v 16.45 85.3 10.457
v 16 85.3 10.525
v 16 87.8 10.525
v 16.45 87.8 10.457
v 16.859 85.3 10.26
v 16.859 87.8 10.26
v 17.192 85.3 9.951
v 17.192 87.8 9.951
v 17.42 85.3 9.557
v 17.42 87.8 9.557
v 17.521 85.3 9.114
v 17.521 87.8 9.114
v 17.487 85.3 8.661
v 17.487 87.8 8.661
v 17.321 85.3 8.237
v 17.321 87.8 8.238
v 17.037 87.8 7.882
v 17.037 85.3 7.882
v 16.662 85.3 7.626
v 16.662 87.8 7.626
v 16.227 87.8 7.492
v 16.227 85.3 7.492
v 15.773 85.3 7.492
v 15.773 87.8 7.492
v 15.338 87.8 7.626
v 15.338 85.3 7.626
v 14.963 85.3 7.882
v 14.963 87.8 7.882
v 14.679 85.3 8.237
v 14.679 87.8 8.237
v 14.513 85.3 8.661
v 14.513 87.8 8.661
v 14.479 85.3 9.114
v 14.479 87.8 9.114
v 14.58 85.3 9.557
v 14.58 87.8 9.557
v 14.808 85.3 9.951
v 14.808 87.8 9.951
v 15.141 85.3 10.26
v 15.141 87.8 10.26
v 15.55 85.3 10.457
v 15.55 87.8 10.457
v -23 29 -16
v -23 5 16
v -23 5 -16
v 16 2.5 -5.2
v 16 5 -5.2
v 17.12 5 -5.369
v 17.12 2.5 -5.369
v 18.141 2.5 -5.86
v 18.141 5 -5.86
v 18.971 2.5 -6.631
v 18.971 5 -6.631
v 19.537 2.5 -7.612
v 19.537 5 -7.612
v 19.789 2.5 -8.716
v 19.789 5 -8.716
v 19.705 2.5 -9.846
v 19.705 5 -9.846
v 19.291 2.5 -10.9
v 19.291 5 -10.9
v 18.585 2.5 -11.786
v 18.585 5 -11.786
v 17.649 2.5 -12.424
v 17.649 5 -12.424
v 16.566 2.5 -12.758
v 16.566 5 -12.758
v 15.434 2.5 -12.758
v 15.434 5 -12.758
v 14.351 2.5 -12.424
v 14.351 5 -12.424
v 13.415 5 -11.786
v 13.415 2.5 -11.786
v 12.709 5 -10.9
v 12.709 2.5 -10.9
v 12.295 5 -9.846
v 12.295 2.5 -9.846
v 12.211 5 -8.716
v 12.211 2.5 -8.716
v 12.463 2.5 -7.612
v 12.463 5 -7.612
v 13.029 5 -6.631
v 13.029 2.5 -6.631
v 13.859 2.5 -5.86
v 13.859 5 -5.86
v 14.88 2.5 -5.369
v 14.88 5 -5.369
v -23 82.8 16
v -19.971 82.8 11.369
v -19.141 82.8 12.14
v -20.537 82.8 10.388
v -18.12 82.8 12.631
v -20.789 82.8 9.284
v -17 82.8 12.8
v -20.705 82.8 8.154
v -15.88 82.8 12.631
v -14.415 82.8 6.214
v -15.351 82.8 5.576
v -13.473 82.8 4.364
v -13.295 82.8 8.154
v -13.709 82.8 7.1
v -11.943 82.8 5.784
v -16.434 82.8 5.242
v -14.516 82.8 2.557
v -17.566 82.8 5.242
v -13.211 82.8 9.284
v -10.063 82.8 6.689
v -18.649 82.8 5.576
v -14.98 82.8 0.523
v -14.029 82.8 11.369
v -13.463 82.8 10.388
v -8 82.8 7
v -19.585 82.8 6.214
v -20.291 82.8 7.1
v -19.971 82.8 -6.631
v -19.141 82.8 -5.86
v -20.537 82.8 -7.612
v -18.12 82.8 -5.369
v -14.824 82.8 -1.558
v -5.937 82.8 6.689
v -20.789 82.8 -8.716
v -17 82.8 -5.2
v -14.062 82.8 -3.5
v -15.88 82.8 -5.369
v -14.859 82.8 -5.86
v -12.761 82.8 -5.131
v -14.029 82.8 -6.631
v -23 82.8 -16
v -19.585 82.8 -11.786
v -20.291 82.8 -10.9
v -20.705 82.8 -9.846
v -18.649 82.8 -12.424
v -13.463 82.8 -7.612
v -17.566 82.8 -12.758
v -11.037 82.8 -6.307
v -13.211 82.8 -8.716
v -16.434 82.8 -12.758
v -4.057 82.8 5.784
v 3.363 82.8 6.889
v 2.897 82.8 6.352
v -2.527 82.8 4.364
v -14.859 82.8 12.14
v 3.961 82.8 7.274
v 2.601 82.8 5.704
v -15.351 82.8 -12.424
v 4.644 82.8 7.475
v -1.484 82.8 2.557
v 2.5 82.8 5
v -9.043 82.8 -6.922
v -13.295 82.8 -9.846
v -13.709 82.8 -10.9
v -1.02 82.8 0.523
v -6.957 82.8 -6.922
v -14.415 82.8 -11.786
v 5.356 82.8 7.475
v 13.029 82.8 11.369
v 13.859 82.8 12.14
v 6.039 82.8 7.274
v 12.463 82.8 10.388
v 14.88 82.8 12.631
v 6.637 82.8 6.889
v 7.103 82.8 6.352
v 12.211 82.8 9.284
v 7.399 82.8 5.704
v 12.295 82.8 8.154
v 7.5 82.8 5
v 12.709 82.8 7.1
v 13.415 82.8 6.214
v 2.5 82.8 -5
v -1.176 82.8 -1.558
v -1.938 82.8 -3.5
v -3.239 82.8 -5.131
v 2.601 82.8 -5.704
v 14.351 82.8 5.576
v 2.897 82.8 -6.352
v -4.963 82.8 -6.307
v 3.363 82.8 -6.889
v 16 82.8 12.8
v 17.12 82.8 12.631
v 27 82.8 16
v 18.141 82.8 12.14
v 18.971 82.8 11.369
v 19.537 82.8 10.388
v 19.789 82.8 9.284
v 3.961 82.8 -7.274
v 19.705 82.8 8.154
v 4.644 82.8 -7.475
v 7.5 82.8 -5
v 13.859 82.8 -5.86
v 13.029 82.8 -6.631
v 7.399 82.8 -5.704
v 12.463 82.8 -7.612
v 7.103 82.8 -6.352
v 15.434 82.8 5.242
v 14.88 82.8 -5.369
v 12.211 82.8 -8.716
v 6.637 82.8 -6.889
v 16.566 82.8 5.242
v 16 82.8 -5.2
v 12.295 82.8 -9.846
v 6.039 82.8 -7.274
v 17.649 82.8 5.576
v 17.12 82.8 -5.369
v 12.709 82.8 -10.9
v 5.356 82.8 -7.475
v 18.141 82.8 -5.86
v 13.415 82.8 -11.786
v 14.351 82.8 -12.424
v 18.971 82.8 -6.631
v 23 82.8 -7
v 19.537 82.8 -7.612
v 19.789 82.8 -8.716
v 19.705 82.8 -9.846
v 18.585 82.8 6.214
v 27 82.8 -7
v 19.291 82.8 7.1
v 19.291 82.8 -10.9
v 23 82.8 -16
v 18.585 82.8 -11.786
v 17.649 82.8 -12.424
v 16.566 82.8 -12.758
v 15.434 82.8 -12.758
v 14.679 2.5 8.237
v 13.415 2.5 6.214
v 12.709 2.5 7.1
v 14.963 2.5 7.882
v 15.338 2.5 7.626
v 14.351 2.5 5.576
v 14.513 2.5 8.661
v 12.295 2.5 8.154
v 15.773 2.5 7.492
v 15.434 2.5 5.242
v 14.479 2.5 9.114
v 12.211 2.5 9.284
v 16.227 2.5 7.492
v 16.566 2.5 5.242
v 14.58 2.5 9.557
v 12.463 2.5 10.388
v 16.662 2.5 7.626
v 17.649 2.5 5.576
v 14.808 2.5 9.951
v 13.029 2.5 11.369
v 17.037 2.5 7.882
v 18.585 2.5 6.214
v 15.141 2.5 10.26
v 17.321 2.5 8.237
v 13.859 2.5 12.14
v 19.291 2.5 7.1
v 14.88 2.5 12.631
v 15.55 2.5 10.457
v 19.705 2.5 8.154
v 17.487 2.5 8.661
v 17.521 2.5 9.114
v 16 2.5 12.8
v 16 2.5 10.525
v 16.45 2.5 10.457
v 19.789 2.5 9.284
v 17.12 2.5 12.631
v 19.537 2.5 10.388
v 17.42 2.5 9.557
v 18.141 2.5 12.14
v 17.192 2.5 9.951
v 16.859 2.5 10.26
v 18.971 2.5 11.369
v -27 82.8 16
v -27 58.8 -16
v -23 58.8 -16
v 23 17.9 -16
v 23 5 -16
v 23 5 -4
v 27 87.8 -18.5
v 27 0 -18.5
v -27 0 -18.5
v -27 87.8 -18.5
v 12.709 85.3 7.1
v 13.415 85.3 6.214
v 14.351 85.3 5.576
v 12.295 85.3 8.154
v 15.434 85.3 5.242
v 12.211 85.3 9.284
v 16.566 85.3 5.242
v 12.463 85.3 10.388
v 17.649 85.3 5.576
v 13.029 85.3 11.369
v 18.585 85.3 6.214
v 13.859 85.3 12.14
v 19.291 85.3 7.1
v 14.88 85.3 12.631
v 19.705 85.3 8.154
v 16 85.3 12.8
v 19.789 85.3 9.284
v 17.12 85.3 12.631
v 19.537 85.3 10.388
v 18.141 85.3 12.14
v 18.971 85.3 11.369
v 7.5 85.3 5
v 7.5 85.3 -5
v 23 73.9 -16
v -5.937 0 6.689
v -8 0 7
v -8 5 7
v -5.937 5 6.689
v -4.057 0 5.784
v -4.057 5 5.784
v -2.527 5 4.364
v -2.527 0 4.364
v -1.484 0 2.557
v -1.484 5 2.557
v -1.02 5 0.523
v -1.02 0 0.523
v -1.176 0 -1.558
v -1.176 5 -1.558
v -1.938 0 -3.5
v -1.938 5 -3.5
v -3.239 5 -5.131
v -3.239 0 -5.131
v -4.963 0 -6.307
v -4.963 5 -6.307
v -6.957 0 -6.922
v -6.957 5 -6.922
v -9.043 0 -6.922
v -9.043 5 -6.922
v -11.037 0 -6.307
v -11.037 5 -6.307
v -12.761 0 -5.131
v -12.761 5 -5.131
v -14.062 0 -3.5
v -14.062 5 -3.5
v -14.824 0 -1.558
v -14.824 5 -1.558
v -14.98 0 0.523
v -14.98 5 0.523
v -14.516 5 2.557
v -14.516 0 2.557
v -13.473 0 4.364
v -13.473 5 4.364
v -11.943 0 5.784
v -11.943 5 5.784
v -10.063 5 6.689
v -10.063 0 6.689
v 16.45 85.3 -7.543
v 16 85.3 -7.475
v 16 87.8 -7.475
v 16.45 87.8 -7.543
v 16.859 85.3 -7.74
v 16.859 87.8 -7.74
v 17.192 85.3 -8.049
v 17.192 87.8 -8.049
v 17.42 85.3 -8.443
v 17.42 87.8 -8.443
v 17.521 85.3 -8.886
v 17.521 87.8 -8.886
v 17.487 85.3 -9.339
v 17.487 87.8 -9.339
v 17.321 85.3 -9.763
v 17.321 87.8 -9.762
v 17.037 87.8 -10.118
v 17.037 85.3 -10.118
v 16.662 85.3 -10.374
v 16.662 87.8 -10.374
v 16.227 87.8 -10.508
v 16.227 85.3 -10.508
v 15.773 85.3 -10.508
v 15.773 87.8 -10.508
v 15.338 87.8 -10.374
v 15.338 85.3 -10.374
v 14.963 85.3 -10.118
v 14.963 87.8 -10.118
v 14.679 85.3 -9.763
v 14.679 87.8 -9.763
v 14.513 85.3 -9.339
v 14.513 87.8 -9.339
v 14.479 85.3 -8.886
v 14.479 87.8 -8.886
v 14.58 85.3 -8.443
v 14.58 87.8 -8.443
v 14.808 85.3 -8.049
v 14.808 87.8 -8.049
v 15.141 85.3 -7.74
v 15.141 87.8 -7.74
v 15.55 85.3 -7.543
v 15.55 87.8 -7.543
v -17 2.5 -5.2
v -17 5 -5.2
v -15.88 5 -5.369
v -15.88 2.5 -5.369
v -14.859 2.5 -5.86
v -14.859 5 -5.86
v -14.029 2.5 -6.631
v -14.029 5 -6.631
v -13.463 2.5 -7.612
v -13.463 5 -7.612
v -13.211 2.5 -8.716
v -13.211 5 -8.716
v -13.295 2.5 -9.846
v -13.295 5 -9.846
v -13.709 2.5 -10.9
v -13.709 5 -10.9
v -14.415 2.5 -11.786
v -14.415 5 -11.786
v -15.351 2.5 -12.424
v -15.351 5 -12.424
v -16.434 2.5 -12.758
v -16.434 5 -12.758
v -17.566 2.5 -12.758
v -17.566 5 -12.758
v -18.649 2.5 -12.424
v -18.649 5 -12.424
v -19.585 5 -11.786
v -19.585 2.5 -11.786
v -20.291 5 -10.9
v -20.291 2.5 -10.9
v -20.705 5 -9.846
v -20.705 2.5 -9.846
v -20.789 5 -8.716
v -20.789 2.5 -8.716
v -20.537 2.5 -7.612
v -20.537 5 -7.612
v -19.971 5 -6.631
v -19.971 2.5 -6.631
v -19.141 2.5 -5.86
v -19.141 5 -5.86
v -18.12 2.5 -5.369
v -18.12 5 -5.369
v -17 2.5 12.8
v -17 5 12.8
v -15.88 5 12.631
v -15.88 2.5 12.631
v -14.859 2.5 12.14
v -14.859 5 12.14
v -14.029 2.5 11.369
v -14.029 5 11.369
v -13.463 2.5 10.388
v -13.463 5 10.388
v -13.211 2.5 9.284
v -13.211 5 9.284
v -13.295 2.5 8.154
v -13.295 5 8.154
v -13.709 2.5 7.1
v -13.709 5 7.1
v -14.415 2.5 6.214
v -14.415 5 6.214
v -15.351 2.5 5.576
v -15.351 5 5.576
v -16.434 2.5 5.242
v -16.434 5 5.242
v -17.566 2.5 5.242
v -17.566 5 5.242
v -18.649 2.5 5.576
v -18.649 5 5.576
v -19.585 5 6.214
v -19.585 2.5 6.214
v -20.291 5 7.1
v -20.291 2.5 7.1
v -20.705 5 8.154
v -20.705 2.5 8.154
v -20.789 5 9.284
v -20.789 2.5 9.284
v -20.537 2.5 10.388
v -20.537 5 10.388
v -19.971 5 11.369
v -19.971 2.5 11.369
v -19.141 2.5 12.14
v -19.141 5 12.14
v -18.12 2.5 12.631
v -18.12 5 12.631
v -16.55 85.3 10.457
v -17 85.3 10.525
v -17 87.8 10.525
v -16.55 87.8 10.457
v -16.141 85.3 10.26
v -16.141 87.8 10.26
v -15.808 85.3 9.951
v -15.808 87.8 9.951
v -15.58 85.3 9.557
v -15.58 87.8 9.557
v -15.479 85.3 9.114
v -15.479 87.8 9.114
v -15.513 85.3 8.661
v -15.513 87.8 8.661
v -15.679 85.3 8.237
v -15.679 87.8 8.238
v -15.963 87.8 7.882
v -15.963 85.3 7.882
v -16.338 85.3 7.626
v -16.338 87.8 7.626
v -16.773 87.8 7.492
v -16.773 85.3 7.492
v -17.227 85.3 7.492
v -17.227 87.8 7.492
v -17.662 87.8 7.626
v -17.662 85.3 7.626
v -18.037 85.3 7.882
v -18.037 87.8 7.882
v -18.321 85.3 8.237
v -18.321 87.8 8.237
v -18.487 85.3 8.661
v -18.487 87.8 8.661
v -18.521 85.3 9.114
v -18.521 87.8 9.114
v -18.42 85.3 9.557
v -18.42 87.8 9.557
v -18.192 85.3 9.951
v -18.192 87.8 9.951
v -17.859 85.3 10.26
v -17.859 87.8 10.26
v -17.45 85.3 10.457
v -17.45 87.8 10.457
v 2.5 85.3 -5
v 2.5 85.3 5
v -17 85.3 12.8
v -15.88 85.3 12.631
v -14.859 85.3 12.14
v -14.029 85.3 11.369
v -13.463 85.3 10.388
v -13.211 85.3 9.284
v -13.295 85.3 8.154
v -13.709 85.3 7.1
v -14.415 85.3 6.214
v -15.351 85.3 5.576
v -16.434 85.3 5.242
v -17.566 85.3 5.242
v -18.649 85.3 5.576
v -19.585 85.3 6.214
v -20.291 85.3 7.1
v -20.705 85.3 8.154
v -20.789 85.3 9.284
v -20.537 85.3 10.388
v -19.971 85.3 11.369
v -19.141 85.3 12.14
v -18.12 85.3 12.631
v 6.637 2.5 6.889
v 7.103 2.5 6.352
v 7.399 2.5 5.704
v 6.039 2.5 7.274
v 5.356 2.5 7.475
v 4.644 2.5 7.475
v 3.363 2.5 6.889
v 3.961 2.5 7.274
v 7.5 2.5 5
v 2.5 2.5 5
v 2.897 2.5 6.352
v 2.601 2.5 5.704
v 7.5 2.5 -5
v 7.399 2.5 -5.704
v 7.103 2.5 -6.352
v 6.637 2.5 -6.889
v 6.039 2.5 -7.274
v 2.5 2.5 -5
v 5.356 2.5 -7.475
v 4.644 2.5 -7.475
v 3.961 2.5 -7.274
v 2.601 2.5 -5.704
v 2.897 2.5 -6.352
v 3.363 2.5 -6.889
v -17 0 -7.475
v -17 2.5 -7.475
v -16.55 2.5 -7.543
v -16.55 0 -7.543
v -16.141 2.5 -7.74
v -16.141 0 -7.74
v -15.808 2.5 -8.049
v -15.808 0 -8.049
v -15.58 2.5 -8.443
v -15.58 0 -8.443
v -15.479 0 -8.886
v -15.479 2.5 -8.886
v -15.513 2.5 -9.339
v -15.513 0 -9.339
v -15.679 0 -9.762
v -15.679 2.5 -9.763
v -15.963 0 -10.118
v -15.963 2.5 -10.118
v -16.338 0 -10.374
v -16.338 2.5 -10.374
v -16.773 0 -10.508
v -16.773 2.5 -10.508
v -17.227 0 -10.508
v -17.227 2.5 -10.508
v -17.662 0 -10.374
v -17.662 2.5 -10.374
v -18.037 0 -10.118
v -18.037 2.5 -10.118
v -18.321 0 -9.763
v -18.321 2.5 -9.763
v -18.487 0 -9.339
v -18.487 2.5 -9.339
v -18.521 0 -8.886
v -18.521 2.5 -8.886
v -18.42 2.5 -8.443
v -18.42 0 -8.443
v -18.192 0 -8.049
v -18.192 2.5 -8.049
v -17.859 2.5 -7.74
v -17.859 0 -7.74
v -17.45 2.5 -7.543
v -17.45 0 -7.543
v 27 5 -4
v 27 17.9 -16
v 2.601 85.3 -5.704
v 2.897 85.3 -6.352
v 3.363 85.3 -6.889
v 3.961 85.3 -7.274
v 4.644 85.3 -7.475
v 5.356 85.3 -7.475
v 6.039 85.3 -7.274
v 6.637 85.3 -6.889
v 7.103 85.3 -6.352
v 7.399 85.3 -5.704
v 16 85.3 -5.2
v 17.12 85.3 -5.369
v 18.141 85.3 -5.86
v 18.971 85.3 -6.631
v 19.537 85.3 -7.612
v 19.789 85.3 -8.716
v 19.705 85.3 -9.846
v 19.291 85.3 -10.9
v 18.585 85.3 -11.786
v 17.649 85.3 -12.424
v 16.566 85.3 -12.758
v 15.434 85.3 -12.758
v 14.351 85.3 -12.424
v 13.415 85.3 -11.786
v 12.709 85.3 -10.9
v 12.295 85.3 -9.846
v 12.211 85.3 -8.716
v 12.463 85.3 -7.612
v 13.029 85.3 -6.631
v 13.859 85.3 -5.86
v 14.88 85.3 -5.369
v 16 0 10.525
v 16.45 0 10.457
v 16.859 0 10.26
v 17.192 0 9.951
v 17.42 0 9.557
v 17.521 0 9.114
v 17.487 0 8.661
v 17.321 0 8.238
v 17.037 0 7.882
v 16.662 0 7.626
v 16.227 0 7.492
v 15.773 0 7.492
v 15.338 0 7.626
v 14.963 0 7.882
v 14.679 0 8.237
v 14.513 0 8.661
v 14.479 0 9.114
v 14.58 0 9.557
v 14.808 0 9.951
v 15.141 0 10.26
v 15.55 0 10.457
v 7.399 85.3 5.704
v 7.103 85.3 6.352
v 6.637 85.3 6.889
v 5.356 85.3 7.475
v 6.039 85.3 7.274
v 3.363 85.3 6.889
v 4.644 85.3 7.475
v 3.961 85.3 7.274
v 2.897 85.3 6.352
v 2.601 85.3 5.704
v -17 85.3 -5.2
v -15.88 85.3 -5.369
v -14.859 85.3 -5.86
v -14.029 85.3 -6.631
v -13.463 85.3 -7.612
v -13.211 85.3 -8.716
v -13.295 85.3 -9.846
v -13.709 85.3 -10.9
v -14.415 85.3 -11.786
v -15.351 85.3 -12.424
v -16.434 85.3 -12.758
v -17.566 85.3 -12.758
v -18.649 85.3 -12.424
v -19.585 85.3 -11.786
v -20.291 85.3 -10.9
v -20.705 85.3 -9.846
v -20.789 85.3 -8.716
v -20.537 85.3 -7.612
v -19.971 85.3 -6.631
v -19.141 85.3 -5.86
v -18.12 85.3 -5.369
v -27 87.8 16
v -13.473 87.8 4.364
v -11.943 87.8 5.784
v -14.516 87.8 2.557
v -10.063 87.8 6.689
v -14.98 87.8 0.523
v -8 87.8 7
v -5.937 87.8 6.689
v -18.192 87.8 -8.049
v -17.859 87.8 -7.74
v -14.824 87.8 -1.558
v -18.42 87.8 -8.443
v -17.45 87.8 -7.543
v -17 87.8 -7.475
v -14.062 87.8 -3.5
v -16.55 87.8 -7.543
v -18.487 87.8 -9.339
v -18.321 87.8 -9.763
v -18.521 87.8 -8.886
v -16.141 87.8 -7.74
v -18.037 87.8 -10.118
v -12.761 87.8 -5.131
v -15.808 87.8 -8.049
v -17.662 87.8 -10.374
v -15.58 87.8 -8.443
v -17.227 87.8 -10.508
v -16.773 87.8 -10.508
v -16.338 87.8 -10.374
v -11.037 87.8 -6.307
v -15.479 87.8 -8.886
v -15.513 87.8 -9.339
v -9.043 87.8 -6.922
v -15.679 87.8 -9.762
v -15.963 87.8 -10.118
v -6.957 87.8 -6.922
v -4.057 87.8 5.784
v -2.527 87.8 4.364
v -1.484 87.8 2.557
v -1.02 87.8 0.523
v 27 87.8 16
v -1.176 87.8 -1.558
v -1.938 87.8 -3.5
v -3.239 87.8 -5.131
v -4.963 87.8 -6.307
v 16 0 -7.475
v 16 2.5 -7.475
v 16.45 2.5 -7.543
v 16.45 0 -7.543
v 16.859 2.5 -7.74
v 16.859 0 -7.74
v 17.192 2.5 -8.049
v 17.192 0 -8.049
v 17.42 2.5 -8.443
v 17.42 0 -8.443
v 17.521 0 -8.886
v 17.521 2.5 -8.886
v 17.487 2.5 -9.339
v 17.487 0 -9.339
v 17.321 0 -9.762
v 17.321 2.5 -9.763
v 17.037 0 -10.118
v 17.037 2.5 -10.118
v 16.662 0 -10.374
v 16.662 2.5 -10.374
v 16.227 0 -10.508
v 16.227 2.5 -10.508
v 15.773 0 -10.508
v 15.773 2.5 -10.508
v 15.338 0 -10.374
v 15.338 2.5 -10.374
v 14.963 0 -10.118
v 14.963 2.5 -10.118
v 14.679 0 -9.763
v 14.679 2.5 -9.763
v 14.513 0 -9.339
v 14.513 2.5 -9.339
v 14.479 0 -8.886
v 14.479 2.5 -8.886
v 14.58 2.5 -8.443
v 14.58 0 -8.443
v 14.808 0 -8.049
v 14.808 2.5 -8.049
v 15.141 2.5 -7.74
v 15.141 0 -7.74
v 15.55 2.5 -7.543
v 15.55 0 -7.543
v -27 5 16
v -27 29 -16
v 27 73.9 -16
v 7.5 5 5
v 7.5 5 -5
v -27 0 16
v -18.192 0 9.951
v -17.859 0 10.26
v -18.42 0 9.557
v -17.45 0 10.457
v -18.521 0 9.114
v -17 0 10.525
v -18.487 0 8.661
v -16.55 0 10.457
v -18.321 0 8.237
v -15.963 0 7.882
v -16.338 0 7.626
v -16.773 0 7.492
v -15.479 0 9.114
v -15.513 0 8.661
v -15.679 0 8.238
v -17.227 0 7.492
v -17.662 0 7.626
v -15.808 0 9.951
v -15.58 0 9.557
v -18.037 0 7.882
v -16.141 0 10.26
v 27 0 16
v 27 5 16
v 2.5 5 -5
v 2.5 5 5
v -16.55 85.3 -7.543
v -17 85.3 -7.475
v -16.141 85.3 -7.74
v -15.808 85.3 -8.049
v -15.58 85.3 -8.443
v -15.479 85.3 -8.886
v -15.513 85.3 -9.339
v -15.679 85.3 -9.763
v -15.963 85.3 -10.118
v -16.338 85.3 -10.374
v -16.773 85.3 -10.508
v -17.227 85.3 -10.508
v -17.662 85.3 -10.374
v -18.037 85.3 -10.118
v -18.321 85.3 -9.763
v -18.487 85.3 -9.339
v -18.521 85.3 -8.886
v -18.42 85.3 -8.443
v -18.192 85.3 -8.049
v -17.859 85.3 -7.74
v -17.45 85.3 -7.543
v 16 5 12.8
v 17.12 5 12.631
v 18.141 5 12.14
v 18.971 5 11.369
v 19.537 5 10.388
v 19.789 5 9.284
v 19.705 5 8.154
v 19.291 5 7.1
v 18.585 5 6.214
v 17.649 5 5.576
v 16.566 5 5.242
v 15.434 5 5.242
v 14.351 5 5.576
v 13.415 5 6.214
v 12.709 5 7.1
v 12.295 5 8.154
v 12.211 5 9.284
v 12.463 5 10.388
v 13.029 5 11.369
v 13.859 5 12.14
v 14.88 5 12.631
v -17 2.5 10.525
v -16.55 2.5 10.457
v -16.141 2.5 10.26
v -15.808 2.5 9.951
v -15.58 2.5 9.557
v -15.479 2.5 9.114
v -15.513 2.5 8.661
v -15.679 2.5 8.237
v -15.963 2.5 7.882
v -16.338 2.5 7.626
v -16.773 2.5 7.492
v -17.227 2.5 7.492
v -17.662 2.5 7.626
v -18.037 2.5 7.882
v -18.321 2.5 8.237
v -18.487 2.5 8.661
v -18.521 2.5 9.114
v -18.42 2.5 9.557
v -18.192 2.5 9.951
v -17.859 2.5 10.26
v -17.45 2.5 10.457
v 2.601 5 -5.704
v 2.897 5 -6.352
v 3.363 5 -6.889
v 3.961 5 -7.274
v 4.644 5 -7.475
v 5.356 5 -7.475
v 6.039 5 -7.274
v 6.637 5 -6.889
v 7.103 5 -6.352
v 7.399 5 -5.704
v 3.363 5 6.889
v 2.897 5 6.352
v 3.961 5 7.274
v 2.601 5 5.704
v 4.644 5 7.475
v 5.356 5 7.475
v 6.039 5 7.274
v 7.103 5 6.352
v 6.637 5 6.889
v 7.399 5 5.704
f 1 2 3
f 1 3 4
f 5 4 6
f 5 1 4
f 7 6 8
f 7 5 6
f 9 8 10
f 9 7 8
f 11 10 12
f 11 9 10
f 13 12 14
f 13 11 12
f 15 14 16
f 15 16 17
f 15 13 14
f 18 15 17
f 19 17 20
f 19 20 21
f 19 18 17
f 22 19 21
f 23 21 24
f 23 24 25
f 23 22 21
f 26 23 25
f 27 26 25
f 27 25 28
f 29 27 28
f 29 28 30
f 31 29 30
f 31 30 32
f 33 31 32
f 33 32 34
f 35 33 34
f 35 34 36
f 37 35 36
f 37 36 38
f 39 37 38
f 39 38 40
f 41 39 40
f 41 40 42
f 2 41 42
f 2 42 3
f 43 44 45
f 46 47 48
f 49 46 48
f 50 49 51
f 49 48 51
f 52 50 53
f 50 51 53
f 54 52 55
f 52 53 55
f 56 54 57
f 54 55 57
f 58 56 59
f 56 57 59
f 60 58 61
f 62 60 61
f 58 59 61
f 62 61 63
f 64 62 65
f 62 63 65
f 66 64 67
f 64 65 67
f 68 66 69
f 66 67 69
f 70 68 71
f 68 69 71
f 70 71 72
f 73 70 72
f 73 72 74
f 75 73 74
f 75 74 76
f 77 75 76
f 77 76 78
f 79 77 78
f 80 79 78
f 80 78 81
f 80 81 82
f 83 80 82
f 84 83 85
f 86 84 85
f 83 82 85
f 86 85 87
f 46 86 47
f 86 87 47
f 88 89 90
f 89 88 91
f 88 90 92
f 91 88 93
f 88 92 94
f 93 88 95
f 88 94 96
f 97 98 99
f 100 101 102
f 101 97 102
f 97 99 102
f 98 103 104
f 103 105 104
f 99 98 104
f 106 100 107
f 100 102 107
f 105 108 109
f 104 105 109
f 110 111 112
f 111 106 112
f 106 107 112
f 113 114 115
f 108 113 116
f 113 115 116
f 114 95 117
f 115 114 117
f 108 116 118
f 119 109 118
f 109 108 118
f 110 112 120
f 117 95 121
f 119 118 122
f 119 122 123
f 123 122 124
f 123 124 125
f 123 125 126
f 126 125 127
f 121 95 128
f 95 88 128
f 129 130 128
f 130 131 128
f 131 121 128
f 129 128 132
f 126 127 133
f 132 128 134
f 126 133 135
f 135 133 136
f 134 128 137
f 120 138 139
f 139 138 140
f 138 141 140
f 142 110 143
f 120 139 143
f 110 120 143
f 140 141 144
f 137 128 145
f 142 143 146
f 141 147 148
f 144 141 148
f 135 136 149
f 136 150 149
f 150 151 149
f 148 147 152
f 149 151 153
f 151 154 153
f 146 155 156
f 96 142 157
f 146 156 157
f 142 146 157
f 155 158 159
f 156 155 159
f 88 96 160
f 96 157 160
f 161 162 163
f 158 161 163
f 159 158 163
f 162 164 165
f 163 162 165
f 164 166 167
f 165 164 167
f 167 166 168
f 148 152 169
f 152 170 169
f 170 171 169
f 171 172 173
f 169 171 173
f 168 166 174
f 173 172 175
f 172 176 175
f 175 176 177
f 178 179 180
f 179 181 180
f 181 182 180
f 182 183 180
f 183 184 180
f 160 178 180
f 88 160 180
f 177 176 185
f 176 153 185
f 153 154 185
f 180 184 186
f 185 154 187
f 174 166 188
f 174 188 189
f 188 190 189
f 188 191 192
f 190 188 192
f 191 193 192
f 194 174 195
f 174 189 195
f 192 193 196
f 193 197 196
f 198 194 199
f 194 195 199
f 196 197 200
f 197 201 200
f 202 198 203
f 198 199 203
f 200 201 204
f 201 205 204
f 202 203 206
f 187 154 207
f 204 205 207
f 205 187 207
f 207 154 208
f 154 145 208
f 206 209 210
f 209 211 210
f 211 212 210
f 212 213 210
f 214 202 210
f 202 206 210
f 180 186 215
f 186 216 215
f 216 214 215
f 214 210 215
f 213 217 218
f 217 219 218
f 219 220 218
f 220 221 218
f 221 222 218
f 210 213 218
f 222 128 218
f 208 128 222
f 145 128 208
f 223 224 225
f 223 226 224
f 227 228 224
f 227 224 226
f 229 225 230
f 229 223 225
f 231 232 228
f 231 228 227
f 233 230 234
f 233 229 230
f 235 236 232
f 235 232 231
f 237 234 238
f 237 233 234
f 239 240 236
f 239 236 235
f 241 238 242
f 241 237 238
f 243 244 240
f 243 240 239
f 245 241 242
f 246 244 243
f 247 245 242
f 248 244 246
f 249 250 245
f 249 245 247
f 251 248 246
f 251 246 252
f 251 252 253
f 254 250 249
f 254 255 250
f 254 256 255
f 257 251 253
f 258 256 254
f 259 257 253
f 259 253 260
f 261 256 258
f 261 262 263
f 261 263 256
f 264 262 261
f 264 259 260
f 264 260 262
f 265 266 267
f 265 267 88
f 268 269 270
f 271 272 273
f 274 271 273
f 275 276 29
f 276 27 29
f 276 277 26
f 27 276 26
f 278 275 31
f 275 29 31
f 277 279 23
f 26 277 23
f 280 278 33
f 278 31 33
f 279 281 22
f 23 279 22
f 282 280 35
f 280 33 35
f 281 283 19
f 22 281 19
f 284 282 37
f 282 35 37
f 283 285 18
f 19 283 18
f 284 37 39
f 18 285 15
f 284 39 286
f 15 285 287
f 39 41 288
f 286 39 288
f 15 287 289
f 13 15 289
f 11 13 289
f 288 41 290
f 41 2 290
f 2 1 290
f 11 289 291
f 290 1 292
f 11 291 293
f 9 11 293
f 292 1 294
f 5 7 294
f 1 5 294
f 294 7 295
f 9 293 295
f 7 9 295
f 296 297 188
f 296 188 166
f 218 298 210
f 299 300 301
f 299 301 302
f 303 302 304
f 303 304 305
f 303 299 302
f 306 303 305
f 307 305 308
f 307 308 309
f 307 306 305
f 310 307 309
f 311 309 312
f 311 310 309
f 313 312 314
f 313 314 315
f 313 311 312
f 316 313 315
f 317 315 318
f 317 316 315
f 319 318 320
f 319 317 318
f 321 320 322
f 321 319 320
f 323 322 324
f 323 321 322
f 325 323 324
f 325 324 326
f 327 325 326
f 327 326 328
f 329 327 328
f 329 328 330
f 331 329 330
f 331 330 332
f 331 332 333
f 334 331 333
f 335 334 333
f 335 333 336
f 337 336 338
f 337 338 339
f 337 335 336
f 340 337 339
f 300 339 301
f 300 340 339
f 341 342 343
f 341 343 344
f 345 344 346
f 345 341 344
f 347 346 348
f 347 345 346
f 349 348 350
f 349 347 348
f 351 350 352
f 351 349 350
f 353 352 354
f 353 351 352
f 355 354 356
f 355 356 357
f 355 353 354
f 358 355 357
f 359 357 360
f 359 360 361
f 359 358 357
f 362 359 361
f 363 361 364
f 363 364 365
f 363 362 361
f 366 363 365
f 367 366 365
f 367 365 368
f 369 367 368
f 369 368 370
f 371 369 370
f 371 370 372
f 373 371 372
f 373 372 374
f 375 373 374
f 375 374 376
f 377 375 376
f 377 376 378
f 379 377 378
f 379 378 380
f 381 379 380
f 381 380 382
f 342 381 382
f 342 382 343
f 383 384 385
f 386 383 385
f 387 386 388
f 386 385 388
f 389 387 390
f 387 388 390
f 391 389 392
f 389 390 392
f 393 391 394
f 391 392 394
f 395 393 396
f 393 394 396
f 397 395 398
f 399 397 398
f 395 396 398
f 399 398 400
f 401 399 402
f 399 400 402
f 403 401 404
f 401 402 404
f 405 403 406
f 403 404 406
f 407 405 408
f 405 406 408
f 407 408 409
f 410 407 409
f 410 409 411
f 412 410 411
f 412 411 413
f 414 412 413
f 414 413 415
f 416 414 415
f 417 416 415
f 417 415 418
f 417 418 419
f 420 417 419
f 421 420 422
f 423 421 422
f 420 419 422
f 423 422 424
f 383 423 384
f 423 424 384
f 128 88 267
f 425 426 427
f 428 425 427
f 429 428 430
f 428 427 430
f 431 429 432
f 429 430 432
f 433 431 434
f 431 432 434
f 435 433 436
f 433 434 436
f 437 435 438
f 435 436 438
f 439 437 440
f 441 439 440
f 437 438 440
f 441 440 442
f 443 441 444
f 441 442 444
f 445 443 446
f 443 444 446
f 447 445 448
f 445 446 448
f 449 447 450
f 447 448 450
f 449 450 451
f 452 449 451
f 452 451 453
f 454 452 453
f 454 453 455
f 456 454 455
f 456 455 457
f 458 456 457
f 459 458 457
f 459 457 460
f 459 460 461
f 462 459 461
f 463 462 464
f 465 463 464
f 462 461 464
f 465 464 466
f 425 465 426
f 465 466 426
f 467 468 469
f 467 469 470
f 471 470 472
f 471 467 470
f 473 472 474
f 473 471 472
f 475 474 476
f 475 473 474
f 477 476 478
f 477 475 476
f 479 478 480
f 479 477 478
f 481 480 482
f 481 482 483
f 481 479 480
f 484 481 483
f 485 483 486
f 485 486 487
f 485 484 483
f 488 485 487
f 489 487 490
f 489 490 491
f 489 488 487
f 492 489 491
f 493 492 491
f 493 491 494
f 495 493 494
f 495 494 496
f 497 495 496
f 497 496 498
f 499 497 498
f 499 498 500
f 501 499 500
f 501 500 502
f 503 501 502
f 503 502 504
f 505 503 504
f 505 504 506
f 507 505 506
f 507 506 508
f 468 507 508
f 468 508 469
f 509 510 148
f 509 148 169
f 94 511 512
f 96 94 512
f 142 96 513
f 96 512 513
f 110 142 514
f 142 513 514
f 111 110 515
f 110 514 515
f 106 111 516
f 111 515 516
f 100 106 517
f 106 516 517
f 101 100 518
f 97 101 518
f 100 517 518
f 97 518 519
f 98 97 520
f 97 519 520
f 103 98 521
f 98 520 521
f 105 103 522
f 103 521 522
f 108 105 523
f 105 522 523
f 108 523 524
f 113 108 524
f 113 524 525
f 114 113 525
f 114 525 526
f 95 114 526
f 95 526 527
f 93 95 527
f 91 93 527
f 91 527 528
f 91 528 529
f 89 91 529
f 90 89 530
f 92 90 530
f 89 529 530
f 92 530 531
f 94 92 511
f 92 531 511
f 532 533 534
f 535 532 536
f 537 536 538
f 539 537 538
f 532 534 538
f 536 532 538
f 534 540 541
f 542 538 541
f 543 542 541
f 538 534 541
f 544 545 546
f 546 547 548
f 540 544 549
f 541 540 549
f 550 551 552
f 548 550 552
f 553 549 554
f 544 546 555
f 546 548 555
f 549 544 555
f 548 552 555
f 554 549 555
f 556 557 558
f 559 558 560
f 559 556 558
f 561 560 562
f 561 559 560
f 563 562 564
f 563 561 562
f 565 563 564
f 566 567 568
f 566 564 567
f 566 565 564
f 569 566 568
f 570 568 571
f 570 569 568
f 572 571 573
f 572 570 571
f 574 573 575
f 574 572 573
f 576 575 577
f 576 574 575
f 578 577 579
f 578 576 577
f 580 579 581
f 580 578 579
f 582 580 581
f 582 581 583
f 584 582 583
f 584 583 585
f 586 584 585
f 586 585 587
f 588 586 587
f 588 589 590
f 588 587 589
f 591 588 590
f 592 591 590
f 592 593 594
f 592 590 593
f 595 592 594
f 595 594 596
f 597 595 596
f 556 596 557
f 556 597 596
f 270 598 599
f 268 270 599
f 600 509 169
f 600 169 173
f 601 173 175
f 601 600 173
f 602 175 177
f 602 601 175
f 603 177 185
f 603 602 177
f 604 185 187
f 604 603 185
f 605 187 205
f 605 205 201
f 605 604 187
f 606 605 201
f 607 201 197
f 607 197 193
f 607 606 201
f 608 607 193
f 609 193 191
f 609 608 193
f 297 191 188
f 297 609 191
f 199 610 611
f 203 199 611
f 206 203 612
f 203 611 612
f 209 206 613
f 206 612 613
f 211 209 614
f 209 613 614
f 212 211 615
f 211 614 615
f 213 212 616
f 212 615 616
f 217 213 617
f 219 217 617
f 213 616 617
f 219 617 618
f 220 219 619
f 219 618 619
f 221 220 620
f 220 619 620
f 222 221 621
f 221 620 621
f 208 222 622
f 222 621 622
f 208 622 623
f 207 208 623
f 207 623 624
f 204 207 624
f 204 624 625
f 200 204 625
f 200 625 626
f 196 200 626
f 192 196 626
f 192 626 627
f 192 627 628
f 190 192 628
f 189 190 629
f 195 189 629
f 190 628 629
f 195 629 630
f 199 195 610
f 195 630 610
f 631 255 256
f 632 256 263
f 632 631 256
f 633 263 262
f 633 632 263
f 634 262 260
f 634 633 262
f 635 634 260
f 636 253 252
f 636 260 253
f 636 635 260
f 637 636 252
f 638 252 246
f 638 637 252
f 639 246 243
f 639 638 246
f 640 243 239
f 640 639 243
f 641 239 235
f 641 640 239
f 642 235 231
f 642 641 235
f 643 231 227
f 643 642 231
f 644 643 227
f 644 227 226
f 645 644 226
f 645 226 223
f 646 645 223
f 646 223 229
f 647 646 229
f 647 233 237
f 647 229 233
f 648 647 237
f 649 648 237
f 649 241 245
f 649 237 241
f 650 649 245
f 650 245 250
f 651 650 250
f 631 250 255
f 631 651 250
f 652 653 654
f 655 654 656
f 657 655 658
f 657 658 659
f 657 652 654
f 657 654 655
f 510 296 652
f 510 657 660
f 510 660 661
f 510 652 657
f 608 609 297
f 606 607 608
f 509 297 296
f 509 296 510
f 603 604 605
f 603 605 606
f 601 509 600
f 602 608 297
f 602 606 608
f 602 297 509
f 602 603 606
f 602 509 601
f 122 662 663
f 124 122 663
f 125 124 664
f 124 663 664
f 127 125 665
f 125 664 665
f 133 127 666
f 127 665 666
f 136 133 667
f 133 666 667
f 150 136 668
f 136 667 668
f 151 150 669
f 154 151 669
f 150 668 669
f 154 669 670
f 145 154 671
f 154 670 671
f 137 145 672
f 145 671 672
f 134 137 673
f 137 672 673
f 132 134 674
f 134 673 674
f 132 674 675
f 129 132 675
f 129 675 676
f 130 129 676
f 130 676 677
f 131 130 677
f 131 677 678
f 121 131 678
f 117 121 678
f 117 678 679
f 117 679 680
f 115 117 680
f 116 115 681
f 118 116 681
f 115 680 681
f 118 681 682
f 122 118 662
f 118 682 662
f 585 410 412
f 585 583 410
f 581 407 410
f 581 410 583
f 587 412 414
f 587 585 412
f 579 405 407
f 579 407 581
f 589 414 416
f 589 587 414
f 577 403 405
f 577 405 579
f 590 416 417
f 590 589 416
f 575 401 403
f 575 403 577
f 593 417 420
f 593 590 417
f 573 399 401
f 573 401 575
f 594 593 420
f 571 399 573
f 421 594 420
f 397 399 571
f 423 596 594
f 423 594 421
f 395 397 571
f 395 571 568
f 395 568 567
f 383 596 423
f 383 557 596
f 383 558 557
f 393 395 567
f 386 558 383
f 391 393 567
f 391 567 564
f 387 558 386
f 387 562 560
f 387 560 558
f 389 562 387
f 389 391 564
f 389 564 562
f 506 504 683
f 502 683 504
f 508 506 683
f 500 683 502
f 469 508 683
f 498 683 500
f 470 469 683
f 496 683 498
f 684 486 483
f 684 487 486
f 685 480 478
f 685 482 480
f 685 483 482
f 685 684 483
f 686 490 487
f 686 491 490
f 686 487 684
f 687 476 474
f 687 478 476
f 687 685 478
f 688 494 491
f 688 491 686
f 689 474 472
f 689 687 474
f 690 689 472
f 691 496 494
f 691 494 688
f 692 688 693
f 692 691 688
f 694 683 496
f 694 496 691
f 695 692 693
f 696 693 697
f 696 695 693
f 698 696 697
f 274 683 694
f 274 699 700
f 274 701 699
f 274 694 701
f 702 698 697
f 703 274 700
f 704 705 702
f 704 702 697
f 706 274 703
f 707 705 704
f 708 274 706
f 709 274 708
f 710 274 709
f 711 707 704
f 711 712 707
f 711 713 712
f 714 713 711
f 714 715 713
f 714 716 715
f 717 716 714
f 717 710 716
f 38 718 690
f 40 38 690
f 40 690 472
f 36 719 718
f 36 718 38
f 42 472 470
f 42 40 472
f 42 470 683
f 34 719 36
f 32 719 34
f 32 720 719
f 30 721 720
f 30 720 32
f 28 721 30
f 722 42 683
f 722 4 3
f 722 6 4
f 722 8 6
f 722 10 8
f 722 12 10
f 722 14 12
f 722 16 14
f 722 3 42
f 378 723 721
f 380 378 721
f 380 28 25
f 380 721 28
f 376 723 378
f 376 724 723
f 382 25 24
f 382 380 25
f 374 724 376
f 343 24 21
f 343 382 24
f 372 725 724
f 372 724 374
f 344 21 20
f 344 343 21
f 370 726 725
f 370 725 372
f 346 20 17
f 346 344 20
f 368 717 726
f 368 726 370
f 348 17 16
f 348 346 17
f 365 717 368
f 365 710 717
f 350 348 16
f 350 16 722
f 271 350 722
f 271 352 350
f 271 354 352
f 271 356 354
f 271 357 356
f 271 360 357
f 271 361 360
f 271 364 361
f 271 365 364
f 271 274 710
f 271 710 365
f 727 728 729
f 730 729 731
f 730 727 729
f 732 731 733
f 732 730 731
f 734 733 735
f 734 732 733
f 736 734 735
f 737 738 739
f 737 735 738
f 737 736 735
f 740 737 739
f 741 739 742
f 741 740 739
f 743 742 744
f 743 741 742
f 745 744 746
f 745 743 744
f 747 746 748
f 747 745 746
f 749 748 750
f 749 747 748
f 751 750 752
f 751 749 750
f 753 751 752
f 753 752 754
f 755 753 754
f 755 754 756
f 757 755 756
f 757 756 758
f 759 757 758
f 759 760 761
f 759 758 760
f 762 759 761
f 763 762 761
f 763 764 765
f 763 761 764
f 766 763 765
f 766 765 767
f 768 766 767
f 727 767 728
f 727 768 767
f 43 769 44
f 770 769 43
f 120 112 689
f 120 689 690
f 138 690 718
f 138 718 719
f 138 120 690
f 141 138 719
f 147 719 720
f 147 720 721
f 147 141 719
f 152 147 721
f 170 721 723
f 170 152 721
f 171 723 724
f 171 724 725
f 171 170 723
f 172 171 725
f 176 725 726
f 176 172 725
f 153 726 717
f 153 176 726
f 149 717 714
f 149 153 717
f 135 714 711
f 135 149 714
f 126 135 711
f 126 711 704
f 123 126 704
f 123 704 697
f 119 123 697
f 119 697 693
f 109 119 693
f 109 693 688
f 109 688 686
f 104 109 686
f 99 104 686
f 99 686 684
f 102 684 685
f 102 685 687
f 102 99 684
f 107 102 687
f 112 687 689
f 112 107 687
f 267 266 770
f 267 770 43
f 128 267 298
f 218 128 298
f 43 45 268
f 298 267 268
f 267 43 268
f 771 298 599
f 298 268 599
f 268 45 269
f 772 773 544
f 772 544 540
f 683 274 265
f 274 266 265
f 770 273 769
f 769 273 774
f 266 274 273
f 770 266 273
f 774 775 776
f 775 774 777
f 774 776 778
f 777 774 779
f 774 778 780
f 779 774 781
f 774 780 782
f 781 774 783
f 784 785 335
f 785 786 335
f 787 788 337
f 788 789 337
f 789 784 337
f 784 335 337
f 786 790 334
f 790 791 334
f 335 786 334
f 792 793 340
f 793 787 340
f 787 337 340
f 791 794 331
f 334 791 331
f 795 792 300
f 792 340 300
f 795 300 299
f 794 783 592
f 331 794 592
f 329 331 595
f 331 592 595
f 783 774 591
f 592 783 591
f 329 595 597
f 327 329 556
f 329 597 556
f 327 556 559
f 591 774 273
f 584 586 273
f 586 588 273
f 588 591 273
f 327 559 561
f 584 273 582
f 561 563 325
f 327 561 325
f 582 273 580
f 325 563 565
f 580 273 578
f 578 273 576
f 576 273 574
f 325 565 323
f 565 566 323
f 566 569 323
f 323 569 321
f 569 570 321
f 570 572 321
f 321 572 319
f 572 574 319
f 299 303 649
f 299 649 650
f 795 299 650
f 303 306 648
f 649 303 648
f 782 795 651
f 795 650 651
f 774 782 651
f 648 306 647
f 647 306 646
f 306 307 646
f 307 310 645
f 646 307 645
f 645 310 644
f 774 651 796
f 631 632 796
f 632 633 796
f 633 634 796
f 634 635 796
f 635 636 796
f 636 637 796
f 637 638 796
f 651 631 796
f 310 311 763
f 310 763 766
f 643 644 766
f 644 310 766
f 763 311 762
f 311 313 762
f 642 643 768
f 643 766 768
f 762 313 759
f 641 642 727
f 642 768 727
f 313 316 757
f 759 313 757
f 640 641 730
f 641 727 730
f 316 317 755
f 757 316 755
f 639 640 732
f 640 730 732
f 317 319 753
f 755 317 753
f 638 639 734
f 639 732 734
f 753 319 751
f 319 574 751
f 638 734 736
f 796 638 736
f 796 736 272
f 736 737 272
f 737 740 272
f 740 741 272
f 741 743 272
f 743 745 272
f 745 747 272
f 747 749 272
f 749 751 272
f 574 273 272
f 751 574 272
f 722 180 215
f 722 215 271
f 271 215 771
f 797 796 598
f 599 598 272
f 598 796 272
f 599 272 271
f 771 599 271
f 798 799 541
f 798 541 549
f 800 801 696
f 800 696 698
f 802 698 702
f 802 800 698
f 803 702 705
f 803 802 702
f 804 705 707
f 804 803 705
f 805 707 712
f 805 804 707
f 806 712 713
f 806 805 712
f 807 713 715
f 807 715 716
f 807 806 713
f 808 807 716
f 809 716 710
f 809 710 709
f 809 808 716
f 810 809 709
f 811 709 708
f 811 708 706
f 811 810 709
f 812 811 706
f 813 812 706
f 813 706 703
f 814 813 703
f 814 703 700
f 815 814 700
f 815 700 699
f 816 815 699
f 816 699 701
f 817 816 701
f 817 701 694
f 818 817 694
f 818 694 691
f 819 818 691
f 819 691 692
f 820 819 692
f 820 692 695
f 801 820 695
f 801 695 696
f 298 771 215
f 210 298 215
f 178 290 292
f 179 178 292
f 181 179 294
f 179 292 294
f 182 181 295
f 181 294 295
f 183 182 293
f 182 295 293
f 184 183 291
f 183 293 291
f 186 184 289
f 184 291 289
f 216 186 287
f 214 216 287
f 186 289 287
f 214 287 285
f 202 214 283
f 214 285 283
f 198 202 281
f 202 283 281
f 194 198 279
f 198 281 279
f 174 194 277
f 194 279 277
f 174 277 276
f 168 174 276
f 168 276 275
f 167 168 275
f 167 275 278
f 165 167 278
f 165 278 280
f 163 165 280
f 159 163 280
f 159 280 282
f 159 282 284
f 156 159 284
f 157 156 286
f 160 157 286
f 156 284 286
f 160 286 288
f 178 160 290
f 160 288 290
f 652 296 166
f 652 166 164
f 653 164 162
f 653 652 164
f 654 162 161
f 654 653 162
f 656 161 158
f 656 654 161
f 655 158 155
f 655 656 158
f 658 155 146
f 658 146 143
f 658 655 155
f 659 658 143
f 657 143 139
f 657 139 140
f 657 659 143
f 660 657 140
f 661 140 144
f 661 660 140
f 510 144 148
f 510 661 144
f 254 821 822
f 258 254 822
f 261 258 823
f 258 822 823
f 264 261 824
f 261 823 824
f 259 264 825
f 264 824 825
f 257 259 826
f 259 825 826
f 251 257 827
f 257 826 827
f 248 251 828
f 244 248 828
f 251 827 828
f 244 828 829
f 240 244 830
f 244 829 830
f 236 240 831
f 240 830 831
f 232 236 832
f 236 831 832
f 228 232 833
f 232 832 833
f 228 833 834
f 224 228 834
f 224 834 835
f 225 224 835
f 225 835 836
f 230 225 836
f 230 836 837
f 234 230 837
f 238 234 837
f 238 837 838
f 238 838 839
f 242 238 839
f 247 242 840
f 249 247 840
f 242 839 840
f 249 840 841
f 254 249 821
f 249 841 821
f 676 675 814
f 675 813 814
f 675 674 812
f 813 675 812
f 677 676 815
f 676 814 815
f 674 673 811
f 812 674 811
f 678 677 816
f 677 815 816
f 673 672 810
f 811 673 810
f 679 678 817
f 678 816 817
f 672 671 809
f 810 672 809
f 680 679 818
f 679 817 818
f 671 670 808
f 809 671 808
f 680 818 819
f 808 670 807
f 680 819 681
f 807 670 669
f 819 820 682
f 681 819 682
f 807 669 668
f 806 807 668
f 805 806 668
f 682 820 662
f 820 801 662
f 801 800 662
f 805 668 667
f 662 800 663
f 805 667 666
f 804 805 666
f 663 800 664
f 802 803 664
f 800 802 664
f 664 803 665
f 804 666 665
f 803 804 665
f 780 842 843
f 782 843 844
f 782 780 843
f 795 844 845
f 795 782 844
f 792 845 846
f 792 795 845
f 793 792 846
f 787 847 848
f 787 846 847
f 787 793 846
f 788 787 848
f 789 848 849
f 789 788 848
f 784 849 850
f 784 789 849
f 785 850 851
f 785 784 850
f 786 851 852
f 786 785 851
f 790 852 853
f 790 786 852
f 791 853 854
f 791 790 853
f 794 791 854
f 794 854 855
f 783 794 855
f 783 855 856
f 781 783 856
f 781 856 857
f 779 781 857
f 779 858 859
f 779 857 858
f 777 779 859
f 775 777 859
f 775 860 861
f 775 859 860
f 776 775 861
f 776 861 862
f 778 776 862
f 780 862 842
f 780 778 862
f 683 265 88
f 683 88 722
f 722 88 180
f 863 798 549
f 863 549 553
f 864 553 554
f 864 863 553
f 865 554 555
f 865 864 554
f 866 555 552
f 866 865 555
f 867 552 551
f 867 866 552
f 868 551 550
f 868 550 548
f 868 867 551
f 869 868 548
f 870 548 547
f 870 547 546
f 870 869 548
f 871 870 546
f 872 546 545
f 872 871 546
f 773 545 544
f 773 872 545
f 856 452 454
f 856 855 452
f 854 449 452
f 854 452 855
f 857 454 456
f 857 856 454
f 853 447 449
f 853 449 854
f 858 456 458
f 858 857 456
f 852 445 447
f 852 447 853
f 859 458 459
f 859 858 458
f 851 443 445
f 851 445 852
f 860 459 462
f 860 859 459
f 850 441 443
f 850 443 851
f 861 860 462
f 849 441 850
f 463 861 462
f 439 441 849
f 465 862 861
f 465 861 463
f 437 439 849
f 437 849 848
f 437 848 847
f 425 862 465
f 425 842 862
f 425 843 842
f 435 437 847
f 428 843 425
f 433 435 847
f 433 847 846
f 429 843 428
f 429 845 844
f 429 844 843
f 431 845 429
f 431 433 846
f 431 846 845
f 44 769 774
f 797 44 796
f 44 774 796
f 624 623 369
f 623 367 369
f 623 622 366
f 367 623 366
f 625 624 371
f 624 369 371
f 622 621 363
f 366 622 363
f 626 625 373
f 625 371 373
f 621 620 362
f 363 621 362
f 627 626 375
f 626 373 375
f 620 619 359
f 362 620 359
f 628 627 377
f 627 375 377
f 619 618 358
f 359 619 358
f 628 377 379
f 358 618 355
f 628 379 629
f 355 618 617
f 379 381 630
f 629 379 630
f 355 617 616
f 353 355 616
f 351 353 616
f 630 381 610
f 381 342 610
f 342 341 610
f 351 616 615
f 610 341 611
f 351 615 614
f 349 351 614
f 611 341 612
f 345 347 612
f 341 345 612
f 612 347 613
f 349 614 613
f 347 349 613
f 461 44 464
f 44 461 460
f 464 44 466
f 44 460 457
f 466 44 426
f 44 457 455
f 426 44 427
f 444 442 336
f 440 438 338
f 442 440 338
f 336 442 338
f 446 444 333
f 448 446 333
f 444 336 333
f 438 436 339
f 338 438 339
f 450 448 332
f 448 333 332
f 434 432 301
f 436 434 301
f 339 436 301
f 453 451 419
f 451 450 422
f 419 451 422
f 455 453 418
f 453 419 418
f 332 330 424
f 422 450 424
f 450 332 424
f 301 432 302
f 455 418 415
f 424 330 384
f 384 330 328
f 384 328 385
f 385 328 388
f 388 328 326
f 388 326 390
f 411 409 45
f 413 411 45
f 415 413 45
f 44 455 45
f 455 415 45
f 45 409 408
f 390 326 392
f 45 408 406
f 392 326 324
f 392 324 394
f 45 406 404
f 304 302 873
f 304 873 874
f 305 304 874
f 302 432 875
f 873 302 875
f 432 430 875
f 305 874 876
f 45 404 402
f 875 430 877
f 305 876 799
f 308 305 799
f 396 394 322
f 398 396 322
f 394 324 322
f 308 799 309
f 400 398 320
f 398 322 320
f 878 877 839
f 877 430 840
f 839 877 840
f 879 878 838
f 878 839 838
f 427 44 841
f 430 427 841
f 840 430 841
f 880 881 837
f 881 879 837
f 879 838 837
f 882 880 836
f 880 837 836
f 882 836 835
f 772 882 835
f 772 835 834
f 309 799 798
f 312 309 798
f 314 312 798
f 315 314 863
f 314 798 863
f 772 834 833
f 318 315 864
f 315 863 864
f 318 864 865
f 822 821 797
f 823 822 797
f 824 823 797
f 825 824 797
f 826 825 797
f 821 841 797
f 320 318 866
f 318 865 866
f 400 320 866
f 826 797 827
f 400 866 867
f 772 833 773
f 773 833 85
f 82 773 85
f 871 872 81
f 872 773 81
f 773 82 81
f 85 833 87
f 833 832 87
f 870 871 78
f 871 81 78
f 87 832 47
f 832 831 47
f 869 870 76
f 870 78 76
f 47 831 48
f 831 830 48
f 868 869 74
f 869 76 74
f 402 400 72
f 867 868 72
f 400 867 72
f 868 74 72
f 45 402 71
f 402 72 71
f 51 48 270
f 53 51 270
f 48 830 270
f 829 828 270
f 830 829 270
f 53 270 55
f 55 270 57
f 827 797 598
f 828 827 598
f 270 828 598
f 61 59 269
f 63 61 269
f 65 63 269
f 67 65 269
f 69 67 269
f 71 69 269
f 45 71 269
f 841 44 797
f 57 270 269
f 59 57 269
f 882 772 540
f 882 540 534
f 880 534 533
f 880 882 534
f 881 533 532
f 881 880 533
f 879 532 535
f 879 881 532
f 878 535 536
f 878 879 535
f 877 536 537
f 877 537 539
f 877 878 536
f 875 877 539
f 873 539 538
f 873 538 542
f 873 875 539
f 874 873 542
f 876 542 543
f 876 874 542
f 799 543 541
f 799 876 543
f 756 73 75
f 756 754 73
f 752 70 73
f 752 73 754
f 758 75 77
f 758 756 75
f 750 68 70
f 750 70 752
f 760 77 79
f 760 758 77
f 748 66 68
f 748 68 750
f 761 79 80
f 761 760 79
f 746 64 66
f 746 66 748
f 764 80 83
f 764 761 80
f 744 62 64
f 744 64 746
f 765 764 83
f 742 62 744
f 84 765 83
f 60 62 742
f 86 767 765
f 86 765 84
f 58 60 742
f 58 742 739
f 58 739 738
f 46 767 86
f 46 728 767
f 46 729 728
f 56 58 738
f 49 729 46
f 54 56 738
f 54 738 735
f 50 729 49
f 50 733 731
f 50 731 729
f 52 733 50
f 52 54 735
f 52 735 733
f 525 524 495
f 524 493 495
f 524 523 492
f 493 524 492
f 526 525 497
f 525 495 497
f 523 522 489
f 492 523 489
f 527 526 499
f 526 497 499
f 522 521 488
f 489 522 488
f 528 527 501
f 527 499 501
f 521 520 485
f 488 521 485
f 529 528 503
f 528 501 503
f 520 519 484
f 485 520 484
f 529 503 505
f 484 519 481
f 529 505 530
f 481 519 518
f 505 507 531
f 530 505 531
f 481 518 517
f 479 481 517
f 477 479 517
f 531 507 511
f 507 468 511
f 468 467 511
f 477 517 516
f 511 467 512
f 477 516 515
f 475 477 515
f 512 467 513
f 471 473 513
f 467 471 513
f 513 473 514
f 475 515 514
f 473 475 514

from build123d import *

# Parameters (mm, degrees)
SKETCH2_W           = 46
SKETCH2_H           = 32
SKETCH2_R           = 1.525
SKETCH2_R_2         = 7
BOSS_EXTRUDE1_DEPTH = 5
SKETCH3_R           = 3.8
CUT_EXTRUDE1_DEPTH  = 2.5
BOSS_EXTRUDE2_DEPTH = 87.8
BOSS_EXTRUDE3_START = 82.8
SKETCH2_2_W         = 46
SKETCH2_2_H         = 32
SKETCH2_2_R         = 1.525
SKETCH2_2_R_2       = 7
BOSS_EXTRUDE3_DEPTH = 5
CUT_EXTRUDE2_START  = 80.3
SKETCH3_3_R         = 3.8
CUT_EXTRUDE2_DEPTH  = 2.5
CUT_EXTRUDE3_DEPTH  = 5
CUT_EXTRUDE4_DEPTH  = 5


with BuildPart() as part:
    # Sketch2 → Boss-Extrude1 (new body)
    with BuildSketch(Plane(origin=(0, 0, 0), x_dir=(1, 0, 0), z_dir=(0, 1, 0))):
        Rectangle(SKETCH2_W, SKETCH2_H)
        with Locations(Location((-17, 9, 0), (0, 0, 270))):
            Circle(SKETCH2_R, mode=Mode.SUBTRACT)
        with Locations(Location((-17, -9, 0), (0, 0, 270))):
            Circle(SKETCH2_R, mode=Mode.SUBTRACT)
        with Locations(Location((16, -9, 0), (0, 0, 270))):
            Circle(SKETCH2_R, mode=Mode.SUBTRACT)
        with Locations(Location((16, 9, 0), (0, 0, 270))):
            Circle(SKETCH2_R, mode=Mode.SUBTRACT)
        with Locations(Location((-8, 0, 0), (0, 0, 270))):
            Circle(SKETCH2_R_2, mode=Mode.SUBTRACT)
    extrude(amount=BOSS_EXTRUDE1_DEPTH)

    # Sketch3 → Cut-Extrude1 (cut)
    with BuildSketch(Plane(origin=(0, 5, 0), x_dir=(1, 0, 0), z_dir=(0, 1, 0))):
        with Locations(Location((-17, 9, 0), (0, 0, 270))):
            Circle(SKETCH3_R)
        with Locations(Location((-17, -9, 0), (0, 0, 270))):
            Circle(SKETCH3_R)
        with Locations(Location((16, -9, 0), (0, 0, 270))):
            Circle(SKETCH3_R)
        with Locations(Location((16, 9, 0), (0, 0, 270))):
            Circle(SKETCH3_R)
        with BuildLine():
            Line((7.5, 5), (7.5, -5))
            ThreePointArc((7.5, -5), (5, -7.5), (2.5, -5))
            Line((2.5, -5), (2.5, 5))
            ThreePointArc((2.5, 5), (5, 7.5), (7.5, 5))
        make_face()
    extrude(amount=-CUT_EXTRUDE1_DEPTH, mode=Mode.SUBTRACT)

    # Sketch4 → Boss-Extrude2 (add)
    with BuildSketch(Plane(origin=(0, 0, 0), x_dir=(-1, 0, 0), z_dir=(0, -1, 0))):
        Polygon((23, 16), (-23, 16), (-23, -16), (-27, -16), (-27, 18.5), (27, 18.5), (27, -16), (23, -16), align=None)
    extrude(amount=-BOSS_EXTRUDE2_DEPTH)

    # Sketch2<2> → Boss-Extrude3 (add)
    with BuildSketch(Plane(origin=(0, 0, 0), x_dir=(1, 0, 0), z_dir=(0, 1, 0)).offset(BOSS_EXTRUDE3_START)):
        Rectangle(SKETCH2_2_W, SKETCH2_2_H)
        with Locations(Location((-17, 9, 0), (0, 0, 270))):
            Circle(SKETCH2_2_R, mode=Mode.SUBTRACT)
        with Locations(Location((-17, -9, 0), (0, 0, 270))):
            Circle(SKETCH2_2_R, mode=Mode.SUBTRACT)
        with Locations(Location((16, -9, 0), (0, 0, 270))):
            Circle(SKETCH2_2_R, mode=Mode.SUBTRACT)
        with Locations(Location((16, 9, 0), (0, 0, 270))):
            Circle(SKETCH2_2_R, mode=Mode.SUBTRACT)
        with Locations(Location((-8, 0, 0), (0, 0, 270))):
            Circle(SKETCH2_2_R_2, mode=Mode.SUBTRACT)
    extrude(amount=BOSS_EXTRUDE3_DEPTH)

    # Sketch3<3> → Cut-Extrude2 (cut)
    with BuildSketch(Plane(origin=(0, 5, 0), x_dir=(1, 0, 0), z_dir=(0, 1, 0)).offset(CUT_EXTRUDE2_START)):
        with Locations(Location((-17, 9, 0), (0, 0, 270))):
            Circle(SKETCH3_3_R)
        with Locations(Location((-17, -9, 0), (0, 0, 270))):
            Circle(SKETCH3_3_R)
        with Locations(Location((16, -9, 0), (0, 0, 270))):
            Circle(SKETCH3_3_R)
        with Locations(Location((16, 9, 0), (0, 0, 270))):
            Circle(SKETCH3_3_R)
        with BuildLine():
            Line((7.5, 5), (7.5, -5))
            ThreePointArc((7.5, -5), (5, -7.5), (2.5, -5))
            Line((2.5, -5), (2.5, 5))
            ThreePointArc((2.5, 5), (5, 7.5), (7.5, 5))
        make_face()
    extrude(amount=-CUT_EXTRUDE2_DEPTH, mode=Mode.SUBTRACT)

    # Sketch5 → Cut-Extrude3 (cut)
    with BuildSketch(Plane(origin=(27, 0, 0), x_dir=(0, 0, -1), z_dir=(1, 0, 0))):
        Polygon((-16, 43.9), (-16, 5), (4, 5), (16, 17.9), (16, 43.9), align=None)
        Polygon((-16, 82.8), (-16, 43.9), (16, 43.9), (16, 73.9), (7, 82.8), align=None)
    extrude(amount=-CUT_EXTRUDE3_DEPTH, mode=Mode.SUBTRACT)

    # Sketch6 → Cut-Extrude4 (cut)
    with BuildSketch(Plane.ZY.offset(27)):
        Polygon((16, 82.8), (16, 5), (-16, 29), (-16, 58.8), align=None)
    extrude(amount=-CUT_EXTRUDE4_DEPTH, mode=Mode.SUBTRACT)


solid = part.part
